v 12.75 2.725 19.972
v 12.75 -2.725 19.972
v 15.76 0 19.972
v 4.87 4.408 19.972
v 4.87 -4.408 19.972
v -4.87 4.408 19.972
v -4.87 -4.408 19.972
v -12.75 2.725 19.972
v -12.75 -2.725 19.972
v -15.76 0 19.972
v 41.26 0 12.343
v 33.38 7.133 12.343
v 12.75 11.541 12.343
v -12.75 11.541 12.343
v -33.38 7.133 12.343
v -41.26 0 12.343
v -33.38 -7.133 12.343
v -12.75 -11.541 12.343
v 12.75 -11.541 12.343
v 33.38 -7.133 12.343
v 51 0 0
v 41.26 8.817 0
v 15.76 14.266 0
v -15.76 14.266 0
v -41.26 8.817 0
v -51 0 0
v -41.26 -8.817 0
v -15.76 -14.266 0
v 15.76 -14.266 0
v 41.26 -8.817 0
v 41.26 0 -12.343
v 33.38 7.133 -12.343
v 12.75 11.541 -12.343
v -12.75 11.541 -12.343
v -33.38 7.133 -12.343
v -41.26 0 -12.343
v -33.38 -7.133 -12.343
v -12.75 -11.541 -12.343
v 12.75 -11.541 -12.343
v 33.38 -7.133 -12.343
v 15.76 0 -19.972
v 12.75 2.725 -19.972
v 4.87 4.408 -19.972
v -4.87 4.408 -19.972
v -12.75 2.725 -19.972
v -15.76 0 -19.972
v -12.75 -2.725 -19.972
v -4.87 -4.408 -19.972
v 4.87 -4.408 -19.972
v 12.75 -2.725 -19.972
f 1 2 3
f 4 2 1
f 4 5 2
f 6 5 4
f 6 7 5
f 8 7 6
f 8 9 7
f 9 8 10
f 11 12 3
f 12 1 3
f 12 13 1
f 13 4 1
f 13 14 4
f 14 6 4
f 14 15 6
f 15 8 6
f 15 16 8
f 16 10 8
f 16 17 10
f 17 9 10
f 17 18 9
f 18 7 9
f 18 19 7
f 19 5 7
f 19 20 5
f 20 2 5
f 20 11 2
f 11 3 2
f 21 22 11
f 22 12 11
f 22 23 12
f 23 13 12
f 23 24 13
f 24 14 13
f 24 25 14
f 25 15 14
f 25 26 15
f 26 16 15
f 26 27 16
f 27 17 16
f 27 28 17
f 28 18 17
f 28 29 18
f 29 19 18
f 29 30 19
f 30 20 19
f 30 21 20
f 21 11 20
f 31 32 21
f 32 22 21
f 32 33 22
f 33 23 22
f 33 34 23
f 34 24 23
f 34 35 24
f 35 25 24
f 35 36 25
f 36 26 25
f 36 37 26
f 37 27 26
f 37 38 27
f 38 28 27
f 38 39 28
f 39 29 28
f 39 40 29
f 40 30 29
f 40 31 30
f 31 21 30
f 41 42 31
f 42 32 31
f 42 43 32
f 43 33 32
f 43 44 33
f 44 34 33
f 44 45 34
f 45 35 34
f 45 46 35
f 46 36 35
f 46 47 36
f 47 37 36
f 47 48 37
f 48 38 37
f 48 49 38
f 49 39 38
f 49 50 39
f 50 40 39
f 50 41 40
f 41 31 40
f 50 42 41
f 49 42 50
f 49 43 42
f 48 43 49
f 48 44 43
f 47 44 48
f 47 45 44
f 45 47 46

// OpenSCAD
// Generated by SolidPython 1.0.1 on 2020-07-29 00:46:52


scale(v = [17, 5, 7]) {
	sphere(r = 3);
}
/***********************************************
*********      SolidPython code:      **********
************************************************
 
# import packages: SolidPython
from solid import *
from solid.utils import *
from itertools import chain, combinations, permutations


class Resize:

    def __init__(self, scad_file):
        self.scad_file = scad_file
        #self.scad_file = import_scad(scad_file)
        # cone/cylinder param:
        self.r1 = 0
        self.r2 = 0
        self.h = 0
        # rectangular prism param:
        self.w = 0
        self.l = 0
        # ellipse param:
        self.r = 0

    # import OpenScad code (file name corresponds to shape)


    # classify shape + parameters
    def assign(self, param1, param2, param3):
        if self.scad_file == 'cone.scad':
            self.r1 = param1
            self.r2 = param2
            self.h = param3
        elif self.scad_file == 'cylinder.scad':
            self.r1 = param1
            self.r2 = param2
            self.h = param3
        elif self.scad_file == 'rectangularPrism.scad':
            self.h = param1
            self.l = param2
            self.w = param3
        else:
            self.r = param1
            self.h = param2

    # resize parameters
    def iterate(self):
        x = range(3, 20, 2)
        i = 1
        if self.scad_file == 'cone.scad':
            tempList = list(permutations(x, 2))
            for temp in tempList:
                param1 = temp[0]
                param2 = temp[1]
                filepath = 'produced_scad_files/' + 'cone' + str(param1) + '_' + str(param2) + '_' + '.scad'
                scad_render_to_file(cylinder(h=param1, r1=param2, r2=0), filepath)

        elif self.scad_file == 'cylinder.scad':
            tempList = list(permutations(x, 3))
            for temp in tempList:
                param1 = temp[0]
                param2 = temp[1]
                filepath = 'produced_scad_files/' + 'cylinder' + str(param1) + '_' + str(param2) + '_' + '.scad'
                scad_render_to_file(cylinder(h=param1, r1=param2, r2=param2), filepath)

        elif self.scad_file == 'rectangularPrism.scad':
            tempList = list(permutations(x, 3))
            for temp in tempList:
                param1 = temp[0]
                param2 = temp[1]
                param3 = temp[2]
                filepath = 'produced_scad_files/' + 'rectangularPrism' + str(param1) + '_' + str(param2) + '_' + str(
                    param3) + '.scad'
                scad_render_to_file(cube(size=(param1, param2, param3)), filepath)

        elif self.scad_file == 'ellipse.scad':
            tempList = list(permutations(x, 4))
            for temp in tempList:
                param1 = temp[0]
                param2 = temp[1]
                param3 = temp[2]
                param4 = temp[3]
                filepath = 'produced_scad_files/' + 'ellipse' + str(param1) + '_' + str(param2) + '_' + str(param3) + '_' + str(param4) + '.scad'
                scad_render_to_file(scale([param1, param2, param3])(sphere(r=param4)), filepath)

    def render_to_scadfile(self):
        scad_render_to_file(scad, 'example.scad') 
 
************************************************/
